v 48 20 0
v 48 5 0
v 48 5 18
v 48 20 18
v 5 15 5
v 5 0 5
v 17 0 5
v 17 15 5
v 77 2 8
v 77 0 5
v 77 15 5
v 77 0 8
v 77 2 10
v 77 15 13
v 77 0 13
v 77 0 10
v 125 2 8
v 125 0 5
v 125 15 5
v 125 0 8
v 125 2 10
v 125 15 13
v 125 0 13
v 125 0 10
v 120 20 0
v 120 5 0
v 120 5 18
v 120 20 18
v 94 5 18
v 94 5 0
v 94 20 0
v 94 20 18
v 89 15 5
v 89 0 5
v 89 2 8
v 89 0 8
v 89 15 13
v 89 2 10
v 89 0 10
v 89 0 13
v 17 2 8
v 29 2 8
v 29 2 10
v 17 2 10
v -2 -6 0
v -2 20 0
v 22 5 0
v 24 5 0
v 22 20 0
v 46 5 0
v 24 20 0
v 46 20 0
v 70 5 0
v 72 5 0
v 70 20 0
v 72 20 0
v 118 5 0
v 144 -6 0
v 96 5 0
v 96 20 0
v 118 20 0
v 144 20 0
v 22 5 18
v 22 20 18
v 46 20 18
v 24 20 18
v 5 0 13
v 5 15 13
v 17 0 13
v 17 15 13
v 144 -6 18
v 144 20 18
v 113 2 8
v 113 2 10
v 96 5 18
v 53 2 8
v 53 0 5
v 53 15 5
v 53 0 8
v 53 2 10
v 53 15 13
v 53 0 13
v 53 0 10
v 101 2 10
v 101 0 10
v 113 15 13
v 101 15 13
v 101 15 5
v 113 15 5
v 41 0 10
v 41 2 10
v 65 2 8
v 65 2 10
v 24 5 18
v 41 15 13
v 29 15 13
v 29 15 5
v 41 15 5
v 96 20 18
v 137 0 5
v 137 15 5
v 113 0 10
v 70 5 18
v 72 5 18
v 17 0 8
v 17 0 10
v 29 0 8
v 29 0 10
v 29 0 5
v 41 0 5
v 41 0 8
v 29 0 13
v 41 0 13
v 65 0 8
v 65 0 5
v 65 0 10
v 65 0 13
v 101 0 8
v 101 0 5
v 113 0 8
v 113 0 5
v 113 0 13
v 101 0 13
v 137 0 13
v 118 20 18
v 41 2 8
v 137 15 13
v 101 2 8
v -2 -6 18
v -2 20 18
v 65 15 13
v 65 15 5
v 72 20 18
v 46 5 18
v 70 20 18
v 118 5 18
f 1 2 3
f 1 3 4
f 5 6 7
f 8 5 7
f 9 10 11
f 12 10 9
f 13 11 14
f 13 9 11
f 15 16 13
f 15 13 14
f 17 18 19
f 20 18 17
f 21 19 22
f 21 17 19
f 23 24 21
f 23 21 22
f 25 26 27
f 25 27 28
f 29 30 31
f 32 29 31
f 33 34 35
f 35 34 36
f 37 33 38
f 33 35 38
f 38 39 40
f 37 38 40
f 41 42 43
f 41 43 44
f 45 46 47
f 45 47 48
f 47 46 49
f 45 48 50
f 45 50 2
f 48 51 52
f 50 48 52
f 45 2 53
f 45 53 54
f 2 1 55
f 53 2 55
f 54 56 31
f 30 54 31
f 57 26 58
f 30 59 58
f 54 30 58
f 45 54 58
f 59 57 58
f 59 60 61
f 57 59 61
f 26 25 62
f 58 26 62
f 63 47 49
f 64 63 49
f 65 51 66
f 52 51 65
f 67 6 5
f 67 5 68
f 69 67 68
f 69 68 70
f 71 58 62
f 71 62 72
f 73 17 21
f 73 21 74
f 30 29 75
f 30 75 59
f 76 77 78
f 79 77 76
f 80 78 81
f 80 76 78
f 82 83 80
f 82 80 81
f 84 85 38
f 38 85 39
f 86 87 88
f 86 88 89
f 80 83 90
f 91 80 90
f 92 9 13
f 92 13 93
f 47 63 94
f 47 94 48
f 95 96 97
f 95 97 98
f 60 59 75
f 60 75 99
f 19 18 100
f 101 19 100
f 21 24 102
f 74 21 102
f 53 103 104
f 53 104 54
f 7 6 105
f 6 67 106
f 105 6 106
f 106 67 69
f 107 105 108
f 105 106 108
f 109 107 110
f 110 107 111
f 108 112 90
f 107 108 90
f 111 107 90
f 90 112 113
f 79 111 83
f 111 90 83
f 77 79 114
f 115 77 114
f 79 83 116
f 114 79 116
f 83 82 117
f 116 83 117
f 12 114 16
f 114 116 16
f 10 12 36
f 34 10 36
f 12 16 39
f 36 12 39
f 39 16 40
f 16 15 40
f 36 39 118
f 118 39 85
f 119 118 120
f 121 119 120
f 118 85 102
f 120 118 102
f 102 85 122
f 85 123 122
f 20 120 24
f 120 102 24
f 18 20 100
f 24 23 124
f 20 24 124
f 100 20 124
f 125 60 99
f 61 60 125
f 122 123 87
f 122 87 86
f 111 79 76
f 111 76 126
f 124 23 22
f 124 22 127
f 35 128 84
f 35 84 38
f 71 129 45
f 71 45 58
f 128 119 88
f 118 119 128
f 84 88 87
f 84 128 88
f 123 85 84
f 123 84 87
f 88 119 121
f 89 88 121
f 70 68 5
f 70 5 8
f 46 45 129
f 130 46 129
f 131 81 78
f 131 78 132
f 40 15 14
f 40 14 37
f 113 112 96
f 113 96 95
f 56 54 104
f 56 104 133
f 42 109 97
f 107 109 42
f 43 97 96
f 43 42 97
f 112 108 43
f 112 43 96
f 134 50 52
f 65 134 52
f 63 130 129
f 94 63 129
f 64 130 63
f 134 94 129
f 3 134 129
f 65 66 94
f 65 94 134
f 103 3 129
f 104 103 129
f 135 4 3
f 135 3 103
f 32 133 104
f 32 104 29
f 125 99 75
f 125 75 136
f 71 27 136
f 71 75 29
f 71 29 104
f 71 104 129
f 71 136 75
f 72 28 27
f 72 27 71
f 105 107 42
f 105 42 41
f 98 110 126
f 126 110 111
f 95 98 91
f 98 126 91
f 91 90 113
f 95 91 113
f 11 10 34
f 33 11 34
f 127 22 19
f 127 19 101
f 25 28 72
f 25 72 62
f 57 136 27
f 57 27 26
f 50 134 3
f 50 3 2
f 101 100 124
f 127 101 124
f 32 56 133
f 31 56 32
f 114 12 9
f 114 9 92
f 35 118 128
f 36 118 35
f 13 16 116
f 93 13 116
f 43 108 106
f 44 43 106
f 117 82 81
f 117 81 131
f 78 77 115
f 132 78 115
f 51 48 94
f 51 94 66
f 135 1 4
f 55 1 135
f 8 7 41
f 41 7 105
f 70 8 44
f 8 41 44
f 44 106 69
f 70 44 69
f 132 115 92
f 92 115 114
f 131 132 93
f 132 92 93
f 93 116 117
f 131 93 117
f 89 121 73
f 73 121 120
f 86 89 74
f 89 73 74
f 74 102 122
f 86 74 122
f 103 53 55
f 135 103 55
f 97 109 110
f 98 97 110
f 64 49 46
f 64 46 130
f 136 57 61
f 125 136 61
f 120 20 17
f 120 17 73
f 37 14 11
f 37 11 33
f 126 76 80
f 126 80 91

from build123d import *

# Parameters (mm, degrees)
SKETCH1_W           = 22
SKETCH1_H           = 20
BOSS_EXTRUDE1_DEPTH = 18
SKETCH2_W           = 12
SKETCH2_H           = 8
CUT_EXTRUDE1_DEPTH  = 15
SKETCH3_W           = 18
SKETCH3_H           = 5
BOSS_EXTRUDE2_DEPTH = 2
LPATTERN1_COUNT     = 6
LPATTERN1_PITCH     = 24
SKETCH4_W           = 18
SKETCH4_H           = 15
BOSS_EXTRUDE3_DEPTH = 2
SKETCH5_W           = 18
SKETCH5_H           = 20
BOSS_EXTRUDE4_DEPTH = 2
SKETCH6_W           = 132
SKETCH6_H           = 2
CUT_EXTRUDE2_DEPTH  = 2
SKETCH7_W           = 146
SKETCH7_H           = 18
BOSS_EXTRUDE5_DEPTH = 6


with BuildPart() as part:
    # Sketch1 → Boss-Extrude1 (new body)
    with BuildSketch(Plane.XY):
        with Locations((11, 10)):
            Rectangle(SKETCH1_W, SKETCH1_H)
    extrude(amount=BOSS_EXTRUDE1_DEPTH)

    # Sketch2 → Cut-Extrude1 (cut)
    with BuildSketch(Plane.XZ):
        with Locations((11, 9)):
            Rectangle(SKETCH2_W, SKETCH2_H)
    extrude(amount=-CUT_EXTRUDE1_DEPTH, mode=Mode.SUBTRACT)

    # Sketch3 → Boss-Extrude2 (add)
    with BuildSketch(Plane(origin=(22, 0, 0), x_dir=(0, 0, -1), z_dir=(1, 0, 0))):
        with Locations((-9, 2.5)):
            Rectangle(SKETCH3_W, SKETCH3_H)
    extrude(amount=BOSS_EXTRUDE2_DEPTH)


with BuildPart() as lpattern1_1:
    # LPattern1: pattern copy
    add(part.part.moved(Location(Vector(1, 0, 0) * (1 * LPATTERN1_PITCH))))


with BuildPart() as lpattern1_2:
    # LPattern1: pattern copy
    add(part.part.moved(Location(Vector(1, 0, 0) * (2 * LPATTERN1_PITCH))))


with BuildPart() as lpattern1_3:
    # LPattern1: pattern copy
    add(part.part.moved(Location(Vector(1, 0, 0) * (3 * LPATTERN1_PITCH))))


with BuildPart() as lpattern1_4:
    # LPattern1: pattern copy
    add(part.part.moved(Location(Vector(1, 0, 0) * (4 * LPATTERN1_PITCH))))


with BuildPart() as lpattern1_5:
    # LPattern1: pattern copy
    add(part.part.moved(Location(Vector(1, 0, 0) * (5 * LPATTERN1_PITCH))))


with BuildPart() as lpattern1_2_1:
    add(lpattern1_2.part)

    # Combine1: union part, LPattern1_3, LPattern1_4, LPattern1_5, LPattern1_1
    add(part.part)
    add(lpattern1_3.part)
    add(lpattern1_4.part)
    add(lpattern1_5.part)
    add(lpattern1_1.part)

    # Sketch4 → Boss-Extrude3 (add)
    with BuildSketch(Plane(origin=(142, 0, 0), x_dir=(0, 0, -1), z_dir=(1, 0, 0))):
        with Locations((-9, 12.5)):
            Rectangle(SKETCH4_W, SKETCH4_H)
    extrude(amount=BOSS_EXTRUDE3_DEPTH)

    # Sketch5 → Boss-Extrude4 (add)
    with BuildSketch(Plane.ZY):
        with Locations((9, 10)):
            Rectangle(SKETCH5_W, SKETCH5_H)
    extrude(amount=BOSS_EXTRUDE4_DEPTH)

    # Sketch6 → Cut-Extrude2 (cut)
    with BuildSketch(Plane(origin=(0, 0, 0), x_dir=(-1, 0, 0), z_dir=(0, -1, 0))):
        with Locations((-71, -9)):
            Rectangle(SKETCH6_W, SKETCH6_H)
    extrude(amount=-CUT_EXTRUDE2_DEPTH, mode=Mode.SUBTRACT)

    # Sketch7 → Boss-Extrude5 (add)
    with BuildSketch(Plane.XZ):
        with Locations((71, 9)):
            Rectangle(SKETCH7_W, SKETCH7_H)
    extrude(amount=BOSS_EXTRUDE5_DEPTH)


solid = lpattern1_2_1.part
